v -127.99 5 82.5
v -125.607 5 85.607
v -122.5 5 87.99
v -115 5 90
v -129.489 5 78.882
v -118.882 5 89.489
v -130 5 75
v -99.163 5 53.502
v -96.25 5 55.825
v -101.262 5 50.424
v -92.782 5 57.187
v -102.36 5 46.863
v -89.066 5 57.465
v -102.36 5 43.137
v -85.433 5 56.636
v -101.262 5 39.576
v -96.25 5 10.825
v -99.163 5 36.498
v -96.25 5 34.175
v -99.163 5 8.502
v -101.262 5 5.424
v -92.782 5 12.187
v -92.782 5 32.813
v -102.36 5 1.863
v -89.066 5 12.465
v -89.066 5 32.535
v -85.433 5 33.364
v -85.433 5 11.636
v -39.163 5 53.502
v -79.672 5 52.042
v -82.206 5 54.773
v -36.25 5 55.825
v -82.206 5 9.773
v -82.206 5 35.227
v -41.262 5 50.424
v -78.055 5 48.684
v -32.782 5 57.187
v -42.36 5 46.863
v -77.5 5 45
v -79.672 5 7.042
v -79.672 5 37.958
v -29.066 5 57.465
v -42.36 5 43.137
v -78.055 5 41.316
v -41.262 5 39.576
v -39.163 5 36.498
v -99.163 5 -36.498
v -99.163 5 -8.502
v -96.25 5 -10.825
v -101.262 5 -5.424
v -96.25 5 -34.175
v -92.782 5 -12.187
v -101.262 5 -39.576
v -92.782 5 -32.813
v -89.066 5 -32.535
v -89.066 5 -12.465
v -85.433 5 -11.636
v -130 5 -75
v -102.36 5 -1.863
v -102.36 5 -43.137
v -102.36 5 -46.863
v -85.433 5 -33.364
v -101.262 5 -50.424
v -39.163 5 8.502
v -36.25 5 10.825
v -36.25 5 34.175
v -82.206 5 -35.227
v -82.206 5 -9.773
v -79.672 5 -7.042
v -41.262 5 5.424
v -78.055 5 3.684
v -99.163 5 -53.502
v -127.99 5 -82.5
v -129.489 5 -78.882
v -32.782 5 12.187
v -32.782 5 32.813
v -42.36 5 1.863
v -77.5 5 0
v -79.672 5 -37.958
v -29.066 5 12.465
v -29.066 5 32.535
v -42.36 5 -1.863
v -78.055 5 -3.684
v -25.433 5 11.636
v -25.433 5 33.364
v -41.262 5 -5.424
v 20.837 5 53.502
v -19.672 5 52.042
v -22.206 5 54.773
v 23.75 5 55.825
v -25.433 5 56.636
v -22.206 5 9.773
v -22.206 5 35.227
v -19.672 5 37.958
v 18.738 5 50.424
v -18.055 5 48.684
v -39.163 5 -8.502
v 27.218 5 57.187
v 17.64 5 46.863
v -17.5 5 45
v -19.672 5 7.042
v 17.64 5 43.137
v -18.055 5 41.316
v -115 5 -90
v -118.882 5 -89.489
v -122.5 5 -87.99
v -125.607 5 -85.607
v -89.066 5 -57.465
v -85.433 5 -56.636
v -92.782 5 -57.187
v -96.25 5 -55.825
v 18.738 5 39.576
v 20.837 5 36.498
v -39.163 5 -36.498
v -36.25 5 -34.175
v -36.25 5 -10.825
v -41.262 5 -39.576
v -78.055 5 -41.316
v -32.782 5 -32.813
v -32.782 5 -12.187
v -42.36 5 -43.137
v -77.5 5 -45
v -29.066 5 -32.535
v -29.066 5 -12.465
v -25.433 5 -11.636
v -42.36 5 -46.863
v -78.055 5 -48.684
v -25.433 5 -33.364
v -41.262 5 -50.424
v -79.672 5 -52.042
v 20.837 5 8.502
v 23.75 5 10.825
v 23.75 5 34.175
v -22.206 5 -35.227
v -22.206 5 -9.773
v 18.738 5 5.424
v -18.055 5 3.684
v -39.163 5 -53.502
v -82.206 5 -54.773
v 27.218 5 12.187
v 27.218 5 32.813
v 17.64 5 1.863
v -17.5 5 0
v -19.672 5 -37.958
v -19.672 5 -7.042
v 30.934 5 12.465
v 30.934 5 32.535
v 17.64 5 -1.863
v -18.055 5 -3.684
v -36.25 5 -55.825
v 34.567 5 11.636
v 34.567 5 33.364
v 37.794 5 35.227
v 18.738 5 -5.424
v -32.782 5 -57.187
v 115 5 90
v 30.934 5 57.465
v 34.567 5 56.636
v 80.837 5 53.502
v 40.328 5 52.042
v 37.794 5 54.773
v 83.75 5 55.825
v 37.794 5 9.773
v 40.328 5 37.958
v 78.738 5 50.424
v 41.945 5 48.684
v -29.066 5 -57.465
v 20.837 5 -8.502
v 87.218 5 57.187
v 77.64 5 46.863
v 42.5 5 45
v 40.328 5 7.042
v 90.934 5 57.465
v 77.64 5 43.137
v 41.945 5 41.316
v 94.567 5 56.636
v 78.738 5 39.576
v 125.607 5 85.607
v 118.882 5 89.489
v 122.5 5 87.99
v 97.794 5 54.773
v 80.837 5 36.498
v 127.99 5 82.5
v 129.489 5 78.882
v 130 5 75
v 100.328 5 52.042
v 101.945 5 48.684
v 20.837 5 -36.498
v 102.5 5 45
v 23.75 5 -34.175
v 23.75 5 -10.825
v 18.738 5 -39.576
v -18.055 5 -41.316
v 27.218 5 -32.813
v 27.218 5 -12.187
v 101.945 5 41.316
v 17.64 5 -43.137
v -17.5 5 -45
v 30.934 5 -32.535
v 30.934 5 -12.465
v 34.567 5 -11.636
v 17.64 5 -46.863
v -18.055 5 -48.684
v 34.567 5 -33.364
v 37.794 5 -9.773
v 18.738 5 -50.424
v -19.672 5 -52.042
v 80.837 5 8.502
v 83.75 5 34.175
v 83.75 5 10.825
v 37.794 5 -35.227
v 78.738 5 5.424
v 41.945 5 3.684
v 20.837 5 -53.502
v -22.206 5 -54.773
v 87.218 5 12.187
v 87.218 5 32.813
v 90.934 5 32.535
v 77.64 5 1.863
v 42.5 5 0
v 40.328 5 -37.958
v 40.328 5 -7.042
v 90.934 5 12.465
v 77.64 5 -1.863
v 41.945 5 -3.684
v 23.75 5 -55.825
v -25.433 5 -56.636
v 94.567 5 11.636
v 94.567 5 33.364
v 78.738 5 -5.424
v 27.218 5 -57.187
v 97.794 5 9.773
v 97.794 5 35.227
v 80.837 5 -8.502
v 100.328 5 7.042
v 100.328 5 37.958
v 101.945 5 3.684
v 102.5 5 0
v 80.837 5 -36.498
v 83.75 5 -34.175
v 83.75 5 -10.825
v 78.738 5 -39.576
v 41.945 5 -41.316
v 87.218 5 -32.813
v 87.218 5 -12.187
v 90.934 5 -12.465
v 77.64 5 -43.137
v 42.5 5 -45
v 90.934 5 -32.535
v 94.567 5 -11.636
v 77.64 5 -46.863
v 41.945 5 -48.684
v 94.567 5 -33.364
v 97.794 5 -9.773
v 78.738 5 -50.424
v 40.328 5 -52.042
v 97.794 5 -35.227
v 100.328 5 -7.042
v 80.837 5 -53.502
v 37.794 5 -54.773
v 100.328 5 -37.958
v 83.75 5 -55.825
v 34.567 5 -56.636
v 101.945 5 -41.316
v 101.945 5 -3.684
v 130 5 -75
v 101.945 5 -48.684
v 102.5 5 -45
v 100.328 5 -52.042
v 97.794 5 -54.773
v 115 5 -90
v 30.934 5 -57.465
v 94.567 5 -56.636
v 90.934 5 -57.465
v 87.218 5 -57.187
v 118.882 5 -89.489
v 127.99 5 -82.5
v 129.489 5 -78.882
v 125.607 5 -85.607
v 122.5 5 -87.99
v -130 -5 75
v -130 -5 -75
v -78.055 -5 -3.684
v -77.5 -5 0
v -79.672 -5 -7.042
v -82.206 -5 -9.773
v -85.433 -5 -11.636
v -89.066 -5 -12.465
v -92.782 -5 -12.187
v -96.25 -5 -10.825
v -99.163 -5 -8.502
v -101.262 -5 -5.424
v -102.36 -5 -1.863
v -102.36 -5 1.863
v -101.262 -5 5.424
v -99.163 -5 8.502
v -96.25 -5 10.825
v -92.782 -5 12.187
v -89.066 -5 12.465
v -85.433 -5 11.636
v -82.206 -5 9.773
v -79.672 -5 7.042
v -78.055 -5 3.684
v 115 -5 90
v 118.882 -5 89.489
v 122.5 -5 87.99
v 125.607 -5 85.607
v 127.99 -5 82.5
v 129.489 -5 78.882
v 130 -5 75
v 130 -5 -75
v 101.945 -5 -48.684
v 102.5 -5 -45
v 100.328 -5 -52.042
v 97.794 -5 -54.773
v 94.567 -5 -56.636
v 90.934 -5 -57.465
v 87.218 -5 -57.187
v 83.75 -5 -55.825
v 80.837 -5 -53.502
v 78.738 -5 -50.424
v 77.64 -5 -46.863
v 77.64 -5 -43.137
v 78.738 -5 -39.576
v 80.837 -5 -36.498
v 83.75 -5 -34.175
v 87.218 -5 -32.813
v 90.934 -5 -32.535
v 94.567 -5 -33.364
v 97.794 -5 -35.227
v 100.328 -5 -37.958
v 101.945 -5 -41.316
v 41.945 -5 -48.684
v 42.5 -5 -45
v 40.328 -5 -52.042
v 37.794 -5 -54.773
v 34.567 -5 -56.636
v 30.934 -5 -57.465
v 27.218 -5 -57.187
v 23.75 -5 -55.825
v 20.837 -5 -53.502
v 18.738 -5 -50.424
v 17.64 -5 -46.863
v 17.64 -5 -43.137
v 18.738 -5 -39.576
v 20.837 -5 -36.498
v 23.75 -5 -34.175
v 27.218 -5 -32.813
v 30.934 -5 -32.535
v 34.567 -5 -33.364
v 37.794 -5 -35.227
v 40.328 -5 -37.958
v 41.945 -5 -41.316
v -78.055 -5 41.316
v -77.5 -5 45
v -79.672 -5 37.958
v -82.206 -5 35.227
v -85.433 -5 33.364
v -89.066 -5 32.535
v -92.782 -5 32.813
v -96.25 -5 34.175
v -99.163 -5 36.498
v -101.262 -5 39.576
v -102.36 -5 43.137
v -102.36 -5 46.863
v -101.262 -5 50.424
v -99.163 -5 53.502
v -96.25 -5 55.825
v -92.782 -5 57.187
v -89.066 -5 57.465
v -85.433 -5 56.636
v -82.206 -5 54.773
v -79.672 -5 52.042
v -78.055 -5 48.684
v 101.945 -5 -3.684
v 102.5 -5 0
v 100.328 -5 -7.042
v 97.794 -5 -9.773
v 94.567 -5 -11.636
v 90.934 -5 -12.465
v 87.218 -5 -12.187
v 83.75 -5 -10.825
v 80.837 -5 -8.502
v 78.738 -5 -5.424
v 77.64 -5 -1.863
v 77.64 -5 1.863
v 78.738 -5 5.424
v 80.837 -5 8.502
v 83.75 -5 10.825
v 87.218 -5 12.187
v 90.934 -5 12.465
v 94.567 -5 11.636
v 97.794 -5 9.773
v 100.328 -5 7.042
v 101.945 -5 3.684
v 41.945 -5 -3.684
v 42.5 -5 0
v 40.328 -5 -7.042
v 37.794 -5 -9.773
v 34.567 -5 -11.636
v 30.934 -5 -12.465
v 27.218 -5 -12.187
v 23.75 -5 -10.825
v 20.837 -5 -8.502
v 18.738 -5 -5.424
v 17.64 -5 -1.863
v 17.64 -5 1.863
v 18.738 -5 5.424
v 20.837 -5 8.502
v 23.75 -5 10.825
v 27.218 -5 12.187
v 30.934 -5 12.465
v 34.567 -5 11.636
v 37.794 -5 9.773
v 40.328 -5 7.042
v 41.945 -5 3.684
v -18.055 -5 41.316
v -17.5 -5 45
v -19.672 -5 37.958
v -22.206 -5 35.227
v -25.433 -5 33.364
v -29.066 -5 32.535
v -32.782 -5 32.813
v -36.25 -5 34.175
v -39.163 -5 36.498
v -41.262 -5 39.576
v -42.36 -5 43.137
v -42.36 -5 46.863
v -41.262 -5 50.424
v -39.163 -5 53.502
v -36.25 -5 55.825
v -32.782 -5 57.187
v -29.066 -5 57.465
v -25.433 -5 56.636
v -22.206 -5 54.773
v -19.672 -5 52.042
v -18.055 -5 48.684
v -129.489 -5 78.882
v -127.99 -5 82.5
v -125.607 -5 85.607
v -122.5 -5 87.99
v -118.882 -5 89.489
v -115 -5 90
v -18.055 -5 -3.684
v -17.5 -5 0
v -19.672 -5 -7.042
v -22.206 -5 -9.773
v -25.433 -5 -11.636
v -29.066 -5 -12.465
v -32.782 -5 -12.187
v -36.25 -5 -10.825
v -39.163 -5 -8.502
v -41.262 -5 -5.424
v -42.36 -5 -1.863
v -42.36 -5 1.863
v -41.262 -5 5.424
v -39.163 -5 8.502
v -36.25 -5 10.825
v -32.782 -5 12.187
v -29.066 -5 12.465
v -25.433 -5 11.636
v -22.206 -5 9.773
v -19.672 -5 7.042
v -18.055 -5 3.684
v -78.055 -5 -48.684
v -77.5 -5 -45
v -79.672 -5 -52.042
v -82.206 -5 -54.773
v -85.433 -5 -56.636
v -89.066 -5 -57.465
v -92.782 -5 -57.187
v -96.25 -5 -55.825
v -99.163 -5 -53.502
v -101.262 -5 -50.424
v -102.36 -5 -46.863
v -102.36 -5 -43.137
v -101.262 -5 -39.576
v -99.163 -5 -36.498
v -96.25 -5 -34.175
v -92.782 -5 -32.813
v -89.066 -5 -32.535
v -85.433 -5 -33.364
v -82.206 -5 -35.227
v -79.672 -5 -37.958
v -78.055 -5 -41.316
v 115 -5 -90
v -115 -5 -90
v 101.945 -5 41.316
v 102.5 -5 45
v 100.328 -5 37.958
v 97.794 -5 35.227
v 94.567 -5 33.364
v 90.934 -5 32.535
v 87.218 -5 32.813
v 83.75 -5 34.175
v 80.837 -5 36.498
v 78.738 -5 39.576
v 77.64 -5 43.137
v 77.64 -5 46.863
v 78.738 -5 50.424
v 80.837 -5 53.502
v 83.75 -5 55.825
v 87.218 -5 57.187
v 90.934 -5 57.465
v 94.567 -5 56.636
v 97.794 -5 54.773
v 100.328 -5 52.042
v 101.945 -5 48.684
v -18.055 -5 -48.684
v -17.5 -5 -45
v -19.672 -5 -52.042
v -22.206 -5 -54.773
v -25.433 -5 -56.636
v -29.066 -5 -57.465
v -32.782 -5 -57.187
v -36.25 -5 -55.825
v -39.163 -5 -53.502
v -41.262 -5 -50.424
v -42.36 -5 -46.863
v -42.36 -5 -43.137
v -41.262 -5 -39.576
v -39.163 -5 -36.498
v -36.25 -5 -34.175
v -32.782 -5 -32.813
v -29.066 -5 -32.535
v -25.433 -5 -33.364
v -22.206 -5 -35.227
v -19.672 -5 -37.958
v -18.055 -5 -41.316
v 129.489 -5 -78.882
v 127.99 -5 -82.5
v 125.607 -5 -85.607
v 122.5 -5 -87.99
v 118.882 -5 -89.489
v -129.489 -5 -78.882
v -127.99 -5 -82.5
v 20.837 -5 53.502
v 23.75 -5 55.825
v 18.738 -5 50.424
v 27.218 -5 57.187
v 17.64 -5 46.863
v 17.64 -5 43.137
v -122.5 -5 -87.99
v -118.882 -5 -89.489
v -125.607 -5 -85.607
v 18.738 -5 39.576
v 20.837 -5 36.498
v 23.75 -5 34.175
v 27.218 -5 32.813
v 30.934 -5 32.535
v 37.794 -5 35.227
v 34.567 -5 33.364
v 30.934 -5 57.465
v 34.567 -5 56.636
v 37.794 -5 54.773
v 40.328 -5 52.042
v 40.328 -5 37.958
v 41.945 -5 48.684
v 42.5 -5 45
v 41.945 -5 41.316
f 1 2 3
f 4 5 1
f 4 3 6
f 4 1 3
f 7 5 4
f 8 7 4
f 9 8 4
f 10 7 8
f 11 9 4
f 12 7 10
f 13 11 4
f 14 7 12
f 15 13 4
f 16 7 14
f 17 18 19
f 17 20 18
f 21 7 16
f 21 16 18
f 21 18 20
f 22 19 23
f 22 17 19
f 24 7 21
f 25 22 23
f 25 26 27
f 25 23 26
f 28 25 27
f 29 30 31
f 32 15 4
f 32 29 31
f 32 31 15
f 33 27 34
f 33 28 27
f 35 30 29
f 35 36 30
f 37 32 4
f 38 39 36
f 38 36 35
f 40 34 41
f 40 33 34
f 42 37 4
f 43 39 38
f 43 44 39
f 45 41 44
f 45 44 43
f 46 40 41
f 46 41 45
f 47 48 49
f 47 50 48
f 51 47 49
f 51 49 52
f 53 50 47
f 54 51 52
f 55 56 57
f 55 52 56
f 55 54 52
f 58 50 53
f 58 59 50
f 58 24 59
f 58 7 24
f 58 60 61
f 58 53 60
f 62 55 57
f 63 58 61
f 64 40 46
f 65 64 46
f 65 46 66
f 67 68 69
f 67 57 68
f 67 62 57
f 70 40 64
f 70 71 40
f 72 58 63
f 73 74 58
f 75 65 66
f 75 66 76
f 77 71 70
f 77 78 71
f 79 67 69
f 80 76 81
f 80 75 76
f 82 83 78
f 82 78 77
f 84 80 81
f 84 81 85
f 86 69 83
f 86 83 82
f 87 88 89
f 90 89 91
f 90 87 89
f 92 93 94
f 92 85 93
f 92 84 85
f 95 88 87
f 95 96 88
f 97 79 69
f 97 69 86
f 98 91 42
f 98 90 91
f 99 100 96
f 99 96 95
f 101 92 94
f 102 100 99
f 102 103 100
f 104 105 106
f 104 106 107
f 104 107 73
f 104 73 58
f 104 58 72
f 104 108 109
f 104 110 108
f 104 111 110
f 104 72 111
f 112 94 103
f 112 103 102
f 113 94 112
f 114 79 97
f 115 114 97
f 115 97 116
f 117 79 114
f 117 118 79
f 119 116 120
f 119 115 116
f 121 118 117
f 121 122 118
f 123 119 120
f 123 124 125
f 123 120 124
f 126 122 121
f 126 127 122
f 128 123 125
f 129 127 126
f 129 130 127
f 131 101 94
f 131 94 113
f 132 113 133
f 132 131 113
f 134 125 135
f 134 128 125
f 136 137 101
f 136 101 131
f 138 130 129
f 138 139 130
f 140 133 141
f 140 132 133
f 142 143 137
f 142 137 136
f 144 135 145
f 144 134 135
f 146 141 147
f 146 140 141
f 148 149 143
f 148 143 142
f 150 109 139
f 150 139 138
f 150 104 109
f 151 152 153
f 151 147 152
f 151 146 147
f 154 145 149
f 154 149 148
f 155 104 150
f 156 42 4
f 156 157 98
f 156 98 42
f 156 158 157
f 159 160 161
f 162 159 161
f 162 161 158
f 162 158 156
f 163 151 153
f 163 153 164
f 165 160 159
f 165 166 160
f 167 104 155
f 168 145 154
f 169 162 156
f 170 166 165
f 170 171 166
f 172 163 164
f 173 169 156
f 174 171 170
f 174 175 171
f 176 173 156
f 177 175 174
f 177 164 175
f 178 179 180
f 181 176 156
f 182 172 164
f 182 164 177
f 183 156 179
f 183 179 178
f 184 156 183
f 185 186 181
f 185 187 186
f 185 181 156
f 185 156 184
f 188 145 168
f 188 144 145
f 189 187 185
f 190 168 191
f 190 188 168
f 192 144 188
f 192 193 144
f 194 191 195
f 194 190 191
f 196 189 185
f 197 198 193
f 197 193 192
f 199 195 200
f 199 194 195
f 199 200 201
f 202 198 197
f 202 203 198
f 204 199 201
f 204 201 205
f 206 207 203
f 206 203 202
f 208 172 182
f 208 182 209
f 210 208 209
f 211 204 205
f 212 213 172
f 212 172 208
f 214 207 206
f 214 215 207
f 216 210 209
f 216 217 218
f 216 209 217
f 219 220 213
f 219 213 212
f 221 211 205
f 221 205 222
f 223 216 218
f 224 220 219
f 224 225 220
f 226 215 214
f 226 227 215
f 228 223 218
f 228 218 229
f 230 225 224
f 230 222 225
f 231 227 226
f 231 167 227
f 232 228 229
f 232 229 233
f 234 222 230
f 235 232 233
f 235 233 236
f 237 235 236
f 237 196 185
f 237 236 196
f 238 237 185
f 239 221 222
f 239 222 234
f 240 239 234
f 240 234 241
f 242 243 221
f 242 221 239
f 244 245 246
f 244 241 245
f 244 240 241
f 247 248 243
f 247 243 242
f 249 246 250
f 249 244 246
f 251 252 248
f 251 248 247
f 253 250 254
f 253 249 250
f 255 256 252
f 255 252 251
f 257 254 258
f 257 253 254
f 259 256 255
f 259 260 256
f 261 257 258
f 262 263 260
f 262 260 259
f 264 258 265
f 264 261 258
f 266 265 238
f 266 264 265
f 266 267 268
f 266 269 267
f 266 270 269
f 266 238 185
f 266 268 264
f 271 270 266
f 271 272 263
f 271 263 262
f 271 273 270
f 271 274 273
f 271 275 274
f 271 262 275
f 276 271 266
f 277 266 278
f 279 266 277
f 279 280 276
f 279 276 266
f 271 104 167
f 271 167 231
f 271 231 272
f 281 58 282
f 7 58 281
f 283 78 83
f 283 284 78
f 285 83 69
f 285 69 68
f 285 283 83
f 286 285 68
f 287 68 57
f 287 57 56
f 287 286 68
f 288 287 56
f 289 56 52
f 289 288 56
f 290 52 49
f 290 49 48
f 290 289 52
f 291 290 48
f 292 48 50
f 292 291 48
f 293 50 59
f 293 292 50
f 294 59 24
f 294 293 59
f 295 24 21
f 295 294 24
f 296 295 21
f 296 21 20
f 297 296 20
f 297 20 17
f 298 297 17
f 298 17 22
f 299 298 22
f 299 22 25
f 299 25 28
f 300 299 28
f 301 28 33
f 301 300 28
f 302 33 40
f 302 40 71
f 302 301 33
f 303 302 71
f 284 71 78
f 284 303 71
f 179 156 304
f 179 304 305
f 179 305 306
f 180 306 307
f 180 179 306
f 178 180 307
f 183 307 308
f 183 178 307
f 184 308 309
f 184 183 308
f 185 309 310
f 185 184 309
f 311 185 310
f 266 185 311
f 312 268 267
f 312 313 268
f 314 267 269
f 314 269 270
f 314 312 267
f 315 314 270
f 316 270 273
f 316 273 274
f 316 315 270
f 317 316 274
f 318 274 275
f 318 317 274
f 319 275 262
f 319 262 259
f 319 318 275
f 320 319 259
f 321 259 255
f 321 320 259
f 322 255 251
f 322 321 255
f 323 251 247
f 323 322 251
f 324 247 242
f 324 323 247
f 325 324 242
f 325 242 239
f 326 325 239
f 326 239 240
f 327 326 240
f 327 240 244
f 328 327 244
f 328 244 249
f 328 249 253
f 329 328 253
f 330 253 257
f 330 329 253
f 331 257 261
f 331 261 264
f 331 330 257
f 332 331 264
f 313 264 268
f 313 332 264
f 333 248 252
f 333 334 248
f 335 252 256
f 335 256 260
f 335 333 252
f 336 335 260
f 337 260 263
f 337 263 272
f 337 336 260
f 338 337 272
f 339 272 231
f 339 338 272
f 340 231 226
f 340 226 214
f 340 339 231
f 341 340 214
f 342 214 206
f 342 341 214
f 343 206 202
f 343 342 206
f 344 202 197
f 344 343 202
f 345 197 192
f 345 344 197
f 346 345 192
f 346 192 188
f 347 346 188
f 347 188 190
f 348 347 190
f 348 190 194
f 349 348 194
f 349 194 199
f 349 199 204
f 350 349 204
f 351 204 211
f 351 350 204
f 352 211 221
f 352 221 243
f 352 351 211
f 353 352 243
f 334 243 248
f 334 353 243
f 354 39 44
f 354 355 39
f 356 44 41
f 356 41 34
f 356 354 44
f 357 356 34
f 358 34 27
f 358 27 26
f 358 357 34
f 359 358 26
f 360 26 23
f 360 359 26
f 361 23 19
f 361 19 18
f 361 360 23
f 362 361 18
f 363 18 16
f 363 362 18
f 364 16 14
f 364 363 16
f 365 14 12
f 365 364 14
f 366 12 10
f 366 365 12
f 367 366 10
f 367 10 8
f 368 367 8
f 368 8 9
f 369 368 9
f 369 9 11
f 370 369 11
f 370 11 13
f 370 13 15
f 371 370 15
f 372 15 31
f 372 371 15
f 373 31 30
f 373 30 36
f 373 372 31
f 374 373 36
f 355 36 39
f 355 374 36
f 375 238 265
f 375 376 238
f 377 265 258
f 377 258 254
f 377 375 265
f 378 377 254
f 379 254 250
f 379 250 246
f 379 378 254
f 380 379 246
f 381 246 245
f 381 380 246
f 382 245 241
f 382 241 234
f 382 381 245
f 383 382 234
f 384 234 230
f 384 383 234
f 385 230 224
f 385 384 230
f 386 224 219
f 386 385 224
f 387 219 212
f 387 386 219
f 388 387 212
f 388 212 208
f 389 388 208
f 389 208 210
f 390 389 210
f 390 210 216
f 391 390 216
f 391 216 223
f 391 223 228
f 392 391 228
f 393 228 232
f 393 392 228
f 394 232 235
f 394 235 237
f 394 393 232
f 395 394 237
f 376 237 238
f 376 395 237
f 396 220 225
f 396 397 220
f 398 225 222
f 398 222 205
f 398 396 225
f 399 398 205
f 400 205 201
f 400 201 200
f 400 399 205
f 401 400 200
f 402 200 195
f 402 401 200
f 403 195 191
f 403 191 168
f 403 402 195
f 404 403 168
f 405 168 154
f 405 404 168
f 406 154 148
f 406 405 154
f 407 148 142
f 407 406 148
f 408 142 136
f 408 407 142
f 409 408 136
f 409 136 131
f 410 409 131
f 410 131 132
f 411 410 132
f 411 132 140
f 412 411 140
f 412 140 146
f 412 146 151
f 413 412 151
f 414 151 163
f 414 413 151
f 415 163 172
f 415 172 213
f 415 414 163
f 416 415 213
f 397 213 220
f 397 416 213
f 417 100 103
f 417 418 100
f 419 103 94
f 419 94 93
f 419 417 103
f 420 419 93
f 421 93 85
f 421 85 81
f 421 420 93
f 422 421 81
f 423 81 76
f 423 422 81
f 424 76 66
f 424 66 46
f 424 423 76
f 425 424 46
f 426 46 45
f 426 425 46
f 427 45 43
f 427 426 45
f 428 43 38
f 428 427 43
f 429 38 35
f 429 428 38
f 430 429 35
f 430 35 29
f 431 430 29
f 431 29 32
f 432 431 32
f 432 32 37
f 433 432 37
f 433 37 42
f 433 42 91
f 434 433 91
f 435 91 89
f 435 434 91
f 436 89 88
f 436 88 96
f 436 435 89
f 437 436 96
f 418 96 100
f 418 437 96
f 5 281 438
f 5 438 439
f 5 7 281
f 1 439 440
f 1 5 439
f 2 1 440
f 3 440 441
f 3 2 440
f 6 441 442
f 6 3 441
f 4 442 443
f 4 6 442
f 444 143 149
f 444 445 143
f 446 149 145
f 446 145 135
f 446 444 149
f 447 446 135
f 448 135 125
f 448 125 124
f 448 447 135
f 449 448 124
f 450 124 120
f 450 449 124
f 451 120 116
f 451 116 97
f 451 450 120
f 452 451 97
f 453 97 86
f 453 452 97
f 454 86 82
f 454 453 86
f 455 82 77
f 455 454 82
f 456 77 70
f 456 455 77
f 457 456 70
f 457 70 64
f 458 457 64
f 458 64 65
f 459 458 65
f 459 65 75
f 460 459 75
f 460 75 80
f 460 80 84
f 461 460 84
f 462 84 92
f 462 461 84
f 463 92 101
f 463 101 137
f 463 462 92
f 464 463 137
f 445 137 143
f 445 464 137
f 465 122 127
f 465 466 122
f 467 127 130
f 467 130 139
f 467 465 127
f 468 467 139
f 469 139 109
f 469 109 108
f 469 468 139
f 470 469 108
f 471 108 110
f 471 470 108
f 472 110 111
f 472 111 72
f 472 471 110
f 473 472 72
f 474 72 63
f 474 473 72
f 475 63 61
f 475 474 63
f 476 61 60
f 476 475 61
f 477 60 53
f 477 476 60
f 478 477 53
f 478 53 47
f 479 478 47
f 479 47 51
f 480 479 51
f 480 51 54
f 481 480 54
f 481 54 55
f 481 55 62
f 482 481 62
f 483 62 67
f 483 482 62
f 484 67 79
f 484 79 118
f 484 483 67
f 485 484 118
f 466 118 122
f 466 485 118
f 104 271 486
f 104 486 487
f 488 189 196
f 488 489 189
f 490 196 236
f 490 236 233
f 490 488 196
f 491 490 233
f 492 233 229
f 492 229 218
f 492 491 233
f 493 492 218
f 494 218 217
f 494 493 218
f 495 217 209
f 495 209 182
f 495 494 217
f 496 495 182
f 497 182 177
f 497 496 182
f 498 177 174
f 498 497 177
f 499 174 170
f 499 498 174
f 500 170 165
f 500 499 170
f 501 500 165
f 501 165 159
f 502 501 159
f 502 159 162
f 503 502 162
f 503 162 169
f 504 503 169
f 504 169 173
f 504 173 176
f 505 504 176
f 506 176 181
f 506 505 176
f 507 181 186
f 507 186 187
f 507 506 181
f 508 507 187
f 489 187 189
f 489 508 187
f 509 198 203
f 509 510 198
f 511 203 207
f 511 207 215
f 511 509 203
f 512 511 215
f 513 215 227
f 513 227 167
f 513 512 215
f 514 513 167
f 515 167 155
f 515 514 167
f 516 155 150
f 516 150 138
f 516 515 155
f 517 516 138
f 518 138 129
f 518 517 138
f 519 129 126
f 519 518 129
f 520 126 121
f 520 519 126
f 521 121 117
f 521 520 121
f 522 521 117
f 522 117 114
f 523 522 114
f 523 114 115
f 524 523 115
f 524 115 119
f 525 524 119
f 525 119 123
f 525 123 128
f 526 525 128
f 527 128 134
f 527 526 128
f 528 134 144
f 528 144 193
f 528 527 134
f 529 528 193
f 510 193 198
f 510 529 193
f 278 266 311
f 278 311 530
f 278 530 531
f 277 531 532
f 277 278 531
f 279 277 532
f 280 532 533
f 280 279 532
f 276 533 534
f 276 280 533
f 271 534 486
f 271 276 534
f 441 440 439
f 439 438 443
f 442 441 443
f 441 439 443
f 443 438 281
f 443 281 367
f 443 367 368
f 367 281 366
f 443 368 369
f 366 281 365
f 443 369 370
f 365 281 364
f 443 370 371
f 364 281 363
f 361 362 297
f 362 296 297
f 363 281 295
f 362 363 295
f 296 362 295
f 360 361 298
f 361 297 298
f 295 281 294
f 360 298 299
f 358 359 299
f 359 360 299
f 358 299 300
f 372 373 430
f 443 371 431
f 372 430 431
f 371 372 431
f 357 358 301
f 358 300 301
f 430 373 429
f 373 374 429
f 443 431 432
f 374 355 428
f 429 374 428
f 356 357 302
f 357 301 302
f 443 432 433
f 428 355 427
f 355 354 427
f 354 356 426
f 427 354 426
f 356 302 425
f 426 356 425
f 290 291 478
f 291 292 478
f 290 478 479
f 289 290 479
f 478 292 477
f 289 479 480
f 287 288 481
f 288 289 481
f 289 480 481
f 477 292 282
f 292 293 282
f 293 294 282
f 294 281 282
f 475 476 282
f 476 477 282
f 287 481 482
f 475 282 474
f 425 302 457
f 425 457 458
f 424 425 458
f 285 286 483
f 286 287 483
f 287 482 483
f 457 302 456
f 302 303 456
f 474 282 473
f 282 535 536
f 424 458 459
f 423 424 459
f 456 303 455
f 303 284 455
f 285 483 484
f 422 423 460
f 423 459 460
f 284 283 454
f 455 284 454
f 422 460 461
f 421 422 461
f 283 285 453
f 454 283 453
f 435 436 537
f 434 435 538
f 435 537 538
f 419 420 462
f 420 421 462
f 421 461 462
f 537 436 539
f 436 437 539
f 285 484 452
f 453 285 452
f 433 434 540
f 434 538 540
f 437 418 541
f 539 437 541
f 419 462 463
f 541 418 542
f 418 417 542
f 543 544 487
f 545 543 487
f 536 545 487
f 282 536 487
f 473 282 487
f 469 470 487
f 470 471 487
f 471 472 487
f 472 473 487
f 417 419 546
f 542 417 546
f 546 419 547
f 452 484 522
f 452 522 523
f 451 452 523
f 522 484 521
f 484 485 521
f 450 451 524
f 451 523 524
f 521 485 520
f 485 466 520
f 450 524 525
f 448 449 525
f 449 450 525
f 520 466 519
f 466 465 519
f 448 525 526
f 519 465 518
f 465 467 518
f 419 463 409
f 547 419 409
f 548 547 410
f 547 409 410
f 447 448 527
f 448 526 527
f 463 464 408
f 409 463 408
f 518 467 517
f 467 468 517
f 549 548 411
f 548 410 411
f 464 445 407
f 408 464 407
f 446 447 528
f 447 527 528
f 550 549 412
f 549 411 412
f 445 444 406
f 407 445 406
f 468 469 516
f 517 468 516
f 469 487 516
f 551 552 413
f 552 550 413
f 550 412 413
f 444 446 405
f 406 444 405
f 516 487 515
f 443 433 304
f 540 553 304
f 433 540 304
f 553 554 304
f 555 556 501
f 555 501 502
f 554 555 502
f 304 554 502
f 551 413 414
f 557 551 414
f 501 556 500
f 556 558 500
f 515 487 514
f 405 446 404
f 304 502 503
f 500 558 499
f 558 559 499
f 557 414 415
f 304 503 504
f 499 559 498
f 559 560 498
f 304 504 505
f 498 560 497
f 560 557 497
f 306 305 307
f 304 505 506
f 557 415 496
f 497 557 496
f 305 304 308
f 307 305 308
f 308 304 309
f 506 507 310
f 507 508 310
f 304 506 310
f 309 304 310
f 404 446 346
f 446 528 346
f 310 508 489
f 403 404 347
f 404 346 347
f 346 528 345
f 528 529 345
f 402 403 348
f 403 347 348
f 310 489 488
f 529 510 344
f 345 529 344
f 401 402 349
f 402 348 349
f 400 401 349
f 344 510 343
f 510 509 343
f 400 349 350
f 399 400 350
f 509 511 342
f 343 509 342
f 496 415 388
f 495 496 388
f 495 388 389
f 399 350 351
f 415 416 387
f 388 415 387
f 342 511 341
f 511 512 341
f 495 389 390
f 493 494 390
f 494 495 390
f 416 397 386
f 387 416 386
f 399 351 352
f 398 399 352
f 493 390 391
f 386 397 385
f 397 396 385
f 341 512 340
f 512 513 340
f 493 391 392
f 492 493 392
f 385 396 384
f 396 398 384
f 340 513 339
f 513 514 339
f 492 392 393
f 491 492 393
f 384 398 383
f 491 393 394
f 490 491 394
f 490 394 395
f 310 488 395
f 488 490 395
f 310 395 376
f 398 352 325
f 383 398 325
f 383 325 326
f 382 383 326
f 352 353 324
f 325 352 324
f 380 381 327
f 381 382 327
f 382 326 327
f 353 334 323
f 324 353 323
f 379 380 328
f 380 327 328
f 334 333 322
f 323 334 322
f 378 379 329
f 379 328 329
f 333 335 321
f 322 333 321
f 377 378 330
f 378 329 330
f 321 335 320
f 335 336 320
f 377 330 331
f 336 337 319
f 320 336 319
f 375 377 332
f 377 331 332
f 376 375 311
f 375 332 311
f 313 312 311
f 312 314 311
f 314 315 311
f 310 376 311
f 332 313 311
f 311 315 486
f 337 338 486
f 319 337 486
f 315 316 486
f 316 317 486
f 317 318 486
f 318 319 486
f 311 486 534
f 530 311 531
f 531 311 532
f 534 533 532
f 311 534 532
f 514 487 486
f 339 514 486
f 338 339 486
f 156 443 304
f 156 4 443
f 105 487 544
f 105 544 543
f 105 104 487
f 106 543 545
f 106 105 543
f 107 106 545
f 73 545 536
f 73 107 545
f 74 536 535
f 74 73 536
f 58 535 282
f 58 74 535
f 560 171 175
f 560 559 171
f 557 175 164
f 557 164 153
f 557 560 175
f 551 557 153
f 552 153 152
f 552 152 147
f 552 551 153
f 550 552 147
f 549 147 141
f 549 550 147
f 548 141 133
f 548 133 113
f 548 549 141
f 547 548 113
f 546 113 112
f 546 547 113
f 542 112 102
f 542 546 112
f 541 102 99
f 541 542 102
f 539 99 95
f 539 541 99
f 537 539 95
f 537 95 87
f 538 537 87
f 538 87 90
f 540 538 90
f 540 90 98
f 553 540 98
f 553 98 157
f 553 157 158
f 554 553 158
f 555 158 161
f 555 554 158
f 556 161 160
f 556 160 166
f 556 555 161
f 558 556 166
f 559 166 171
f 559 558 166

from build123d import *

# Parameters (mm, degrees)
SKETCH1_R           = 12.5
BOSS_EXTRUDE1_DEPTH = 5


with BuildPart() as part:
    # Sketch1 → Boss-Extrude1 (new body, symmetric)
    with BuildSketch(Plane(origin=(0, 0, 0), x_dir=(1, 0, 0), z_dir=(0, 1, 0))):
        with BuildLine():
            Line((-115, -90), (115, -90))
            ThreePointArc((115, -90), (125.606601718, -85.606601718), (130, -75))
            Line((130, -75), (130, 75))
            ThreePointArc((130, 75), (125.606601718, 85.606601718), (115, 90))
            Line((115, 90), (-115, 90))
            ThreePointArc((-115, 90), (-125.606601718, 85.606601718), (-130, 75))
            Line((-130, 75), (-130, -75))
            ThreePointArc((-130, -75), (-125.606601718, -85.606601718), (-115, -90))
        make_face()
        with Locations((-90, 45)):
            Circle(SKETCH1_R, mode=Mode.SUBTRACT)
        with Locations((-30, 45)):
            Circle(SKETCH1_R, mode=Mode.SUBTRACT)
        with Locations((30, 45)):
            Circle(SKETCH1_R, mode=Mode.SUBTRACT)
        with Locations((90, 45)):
            Circle(SKETCH1_R, mode=Mode.SUBTRACT)
        with Locations((-30, 0)):
            Circle(SKETCH1_R, mode=Mode.SUBTRACT)
        with Locations((30, 0)):
            Circle(SKETCH1_R, mode=Mode.SUBTRACT)
        with Locations((90, 0)):
            Circle(SKETCH1_R, mode=Mode.SUBTRACT)
        with Locations((-30, -45)):
            Circle(SKETCH1_R, mode=Mode.SUBTRACT)
        with Locations((30, -45)):
            Circle(SKETCH1_R, mode=Mode.SUBTRACT)
        with Locations((90, -45)):
            Circle(SKETCH1_R, mode=Mode.SUBTRACT)
        with Locations((-90, 0)):
            Circle(SKETCH1_R, mode=Mode.SUBTRACT)
        with Locations((-90, -45)):
            Circle(SKETCH1_R, mode=Mode.SUBTRACT)
    extrude(amount=BOSS_EXTRUDE1_DEPTH, both=True)


solid = part.part
